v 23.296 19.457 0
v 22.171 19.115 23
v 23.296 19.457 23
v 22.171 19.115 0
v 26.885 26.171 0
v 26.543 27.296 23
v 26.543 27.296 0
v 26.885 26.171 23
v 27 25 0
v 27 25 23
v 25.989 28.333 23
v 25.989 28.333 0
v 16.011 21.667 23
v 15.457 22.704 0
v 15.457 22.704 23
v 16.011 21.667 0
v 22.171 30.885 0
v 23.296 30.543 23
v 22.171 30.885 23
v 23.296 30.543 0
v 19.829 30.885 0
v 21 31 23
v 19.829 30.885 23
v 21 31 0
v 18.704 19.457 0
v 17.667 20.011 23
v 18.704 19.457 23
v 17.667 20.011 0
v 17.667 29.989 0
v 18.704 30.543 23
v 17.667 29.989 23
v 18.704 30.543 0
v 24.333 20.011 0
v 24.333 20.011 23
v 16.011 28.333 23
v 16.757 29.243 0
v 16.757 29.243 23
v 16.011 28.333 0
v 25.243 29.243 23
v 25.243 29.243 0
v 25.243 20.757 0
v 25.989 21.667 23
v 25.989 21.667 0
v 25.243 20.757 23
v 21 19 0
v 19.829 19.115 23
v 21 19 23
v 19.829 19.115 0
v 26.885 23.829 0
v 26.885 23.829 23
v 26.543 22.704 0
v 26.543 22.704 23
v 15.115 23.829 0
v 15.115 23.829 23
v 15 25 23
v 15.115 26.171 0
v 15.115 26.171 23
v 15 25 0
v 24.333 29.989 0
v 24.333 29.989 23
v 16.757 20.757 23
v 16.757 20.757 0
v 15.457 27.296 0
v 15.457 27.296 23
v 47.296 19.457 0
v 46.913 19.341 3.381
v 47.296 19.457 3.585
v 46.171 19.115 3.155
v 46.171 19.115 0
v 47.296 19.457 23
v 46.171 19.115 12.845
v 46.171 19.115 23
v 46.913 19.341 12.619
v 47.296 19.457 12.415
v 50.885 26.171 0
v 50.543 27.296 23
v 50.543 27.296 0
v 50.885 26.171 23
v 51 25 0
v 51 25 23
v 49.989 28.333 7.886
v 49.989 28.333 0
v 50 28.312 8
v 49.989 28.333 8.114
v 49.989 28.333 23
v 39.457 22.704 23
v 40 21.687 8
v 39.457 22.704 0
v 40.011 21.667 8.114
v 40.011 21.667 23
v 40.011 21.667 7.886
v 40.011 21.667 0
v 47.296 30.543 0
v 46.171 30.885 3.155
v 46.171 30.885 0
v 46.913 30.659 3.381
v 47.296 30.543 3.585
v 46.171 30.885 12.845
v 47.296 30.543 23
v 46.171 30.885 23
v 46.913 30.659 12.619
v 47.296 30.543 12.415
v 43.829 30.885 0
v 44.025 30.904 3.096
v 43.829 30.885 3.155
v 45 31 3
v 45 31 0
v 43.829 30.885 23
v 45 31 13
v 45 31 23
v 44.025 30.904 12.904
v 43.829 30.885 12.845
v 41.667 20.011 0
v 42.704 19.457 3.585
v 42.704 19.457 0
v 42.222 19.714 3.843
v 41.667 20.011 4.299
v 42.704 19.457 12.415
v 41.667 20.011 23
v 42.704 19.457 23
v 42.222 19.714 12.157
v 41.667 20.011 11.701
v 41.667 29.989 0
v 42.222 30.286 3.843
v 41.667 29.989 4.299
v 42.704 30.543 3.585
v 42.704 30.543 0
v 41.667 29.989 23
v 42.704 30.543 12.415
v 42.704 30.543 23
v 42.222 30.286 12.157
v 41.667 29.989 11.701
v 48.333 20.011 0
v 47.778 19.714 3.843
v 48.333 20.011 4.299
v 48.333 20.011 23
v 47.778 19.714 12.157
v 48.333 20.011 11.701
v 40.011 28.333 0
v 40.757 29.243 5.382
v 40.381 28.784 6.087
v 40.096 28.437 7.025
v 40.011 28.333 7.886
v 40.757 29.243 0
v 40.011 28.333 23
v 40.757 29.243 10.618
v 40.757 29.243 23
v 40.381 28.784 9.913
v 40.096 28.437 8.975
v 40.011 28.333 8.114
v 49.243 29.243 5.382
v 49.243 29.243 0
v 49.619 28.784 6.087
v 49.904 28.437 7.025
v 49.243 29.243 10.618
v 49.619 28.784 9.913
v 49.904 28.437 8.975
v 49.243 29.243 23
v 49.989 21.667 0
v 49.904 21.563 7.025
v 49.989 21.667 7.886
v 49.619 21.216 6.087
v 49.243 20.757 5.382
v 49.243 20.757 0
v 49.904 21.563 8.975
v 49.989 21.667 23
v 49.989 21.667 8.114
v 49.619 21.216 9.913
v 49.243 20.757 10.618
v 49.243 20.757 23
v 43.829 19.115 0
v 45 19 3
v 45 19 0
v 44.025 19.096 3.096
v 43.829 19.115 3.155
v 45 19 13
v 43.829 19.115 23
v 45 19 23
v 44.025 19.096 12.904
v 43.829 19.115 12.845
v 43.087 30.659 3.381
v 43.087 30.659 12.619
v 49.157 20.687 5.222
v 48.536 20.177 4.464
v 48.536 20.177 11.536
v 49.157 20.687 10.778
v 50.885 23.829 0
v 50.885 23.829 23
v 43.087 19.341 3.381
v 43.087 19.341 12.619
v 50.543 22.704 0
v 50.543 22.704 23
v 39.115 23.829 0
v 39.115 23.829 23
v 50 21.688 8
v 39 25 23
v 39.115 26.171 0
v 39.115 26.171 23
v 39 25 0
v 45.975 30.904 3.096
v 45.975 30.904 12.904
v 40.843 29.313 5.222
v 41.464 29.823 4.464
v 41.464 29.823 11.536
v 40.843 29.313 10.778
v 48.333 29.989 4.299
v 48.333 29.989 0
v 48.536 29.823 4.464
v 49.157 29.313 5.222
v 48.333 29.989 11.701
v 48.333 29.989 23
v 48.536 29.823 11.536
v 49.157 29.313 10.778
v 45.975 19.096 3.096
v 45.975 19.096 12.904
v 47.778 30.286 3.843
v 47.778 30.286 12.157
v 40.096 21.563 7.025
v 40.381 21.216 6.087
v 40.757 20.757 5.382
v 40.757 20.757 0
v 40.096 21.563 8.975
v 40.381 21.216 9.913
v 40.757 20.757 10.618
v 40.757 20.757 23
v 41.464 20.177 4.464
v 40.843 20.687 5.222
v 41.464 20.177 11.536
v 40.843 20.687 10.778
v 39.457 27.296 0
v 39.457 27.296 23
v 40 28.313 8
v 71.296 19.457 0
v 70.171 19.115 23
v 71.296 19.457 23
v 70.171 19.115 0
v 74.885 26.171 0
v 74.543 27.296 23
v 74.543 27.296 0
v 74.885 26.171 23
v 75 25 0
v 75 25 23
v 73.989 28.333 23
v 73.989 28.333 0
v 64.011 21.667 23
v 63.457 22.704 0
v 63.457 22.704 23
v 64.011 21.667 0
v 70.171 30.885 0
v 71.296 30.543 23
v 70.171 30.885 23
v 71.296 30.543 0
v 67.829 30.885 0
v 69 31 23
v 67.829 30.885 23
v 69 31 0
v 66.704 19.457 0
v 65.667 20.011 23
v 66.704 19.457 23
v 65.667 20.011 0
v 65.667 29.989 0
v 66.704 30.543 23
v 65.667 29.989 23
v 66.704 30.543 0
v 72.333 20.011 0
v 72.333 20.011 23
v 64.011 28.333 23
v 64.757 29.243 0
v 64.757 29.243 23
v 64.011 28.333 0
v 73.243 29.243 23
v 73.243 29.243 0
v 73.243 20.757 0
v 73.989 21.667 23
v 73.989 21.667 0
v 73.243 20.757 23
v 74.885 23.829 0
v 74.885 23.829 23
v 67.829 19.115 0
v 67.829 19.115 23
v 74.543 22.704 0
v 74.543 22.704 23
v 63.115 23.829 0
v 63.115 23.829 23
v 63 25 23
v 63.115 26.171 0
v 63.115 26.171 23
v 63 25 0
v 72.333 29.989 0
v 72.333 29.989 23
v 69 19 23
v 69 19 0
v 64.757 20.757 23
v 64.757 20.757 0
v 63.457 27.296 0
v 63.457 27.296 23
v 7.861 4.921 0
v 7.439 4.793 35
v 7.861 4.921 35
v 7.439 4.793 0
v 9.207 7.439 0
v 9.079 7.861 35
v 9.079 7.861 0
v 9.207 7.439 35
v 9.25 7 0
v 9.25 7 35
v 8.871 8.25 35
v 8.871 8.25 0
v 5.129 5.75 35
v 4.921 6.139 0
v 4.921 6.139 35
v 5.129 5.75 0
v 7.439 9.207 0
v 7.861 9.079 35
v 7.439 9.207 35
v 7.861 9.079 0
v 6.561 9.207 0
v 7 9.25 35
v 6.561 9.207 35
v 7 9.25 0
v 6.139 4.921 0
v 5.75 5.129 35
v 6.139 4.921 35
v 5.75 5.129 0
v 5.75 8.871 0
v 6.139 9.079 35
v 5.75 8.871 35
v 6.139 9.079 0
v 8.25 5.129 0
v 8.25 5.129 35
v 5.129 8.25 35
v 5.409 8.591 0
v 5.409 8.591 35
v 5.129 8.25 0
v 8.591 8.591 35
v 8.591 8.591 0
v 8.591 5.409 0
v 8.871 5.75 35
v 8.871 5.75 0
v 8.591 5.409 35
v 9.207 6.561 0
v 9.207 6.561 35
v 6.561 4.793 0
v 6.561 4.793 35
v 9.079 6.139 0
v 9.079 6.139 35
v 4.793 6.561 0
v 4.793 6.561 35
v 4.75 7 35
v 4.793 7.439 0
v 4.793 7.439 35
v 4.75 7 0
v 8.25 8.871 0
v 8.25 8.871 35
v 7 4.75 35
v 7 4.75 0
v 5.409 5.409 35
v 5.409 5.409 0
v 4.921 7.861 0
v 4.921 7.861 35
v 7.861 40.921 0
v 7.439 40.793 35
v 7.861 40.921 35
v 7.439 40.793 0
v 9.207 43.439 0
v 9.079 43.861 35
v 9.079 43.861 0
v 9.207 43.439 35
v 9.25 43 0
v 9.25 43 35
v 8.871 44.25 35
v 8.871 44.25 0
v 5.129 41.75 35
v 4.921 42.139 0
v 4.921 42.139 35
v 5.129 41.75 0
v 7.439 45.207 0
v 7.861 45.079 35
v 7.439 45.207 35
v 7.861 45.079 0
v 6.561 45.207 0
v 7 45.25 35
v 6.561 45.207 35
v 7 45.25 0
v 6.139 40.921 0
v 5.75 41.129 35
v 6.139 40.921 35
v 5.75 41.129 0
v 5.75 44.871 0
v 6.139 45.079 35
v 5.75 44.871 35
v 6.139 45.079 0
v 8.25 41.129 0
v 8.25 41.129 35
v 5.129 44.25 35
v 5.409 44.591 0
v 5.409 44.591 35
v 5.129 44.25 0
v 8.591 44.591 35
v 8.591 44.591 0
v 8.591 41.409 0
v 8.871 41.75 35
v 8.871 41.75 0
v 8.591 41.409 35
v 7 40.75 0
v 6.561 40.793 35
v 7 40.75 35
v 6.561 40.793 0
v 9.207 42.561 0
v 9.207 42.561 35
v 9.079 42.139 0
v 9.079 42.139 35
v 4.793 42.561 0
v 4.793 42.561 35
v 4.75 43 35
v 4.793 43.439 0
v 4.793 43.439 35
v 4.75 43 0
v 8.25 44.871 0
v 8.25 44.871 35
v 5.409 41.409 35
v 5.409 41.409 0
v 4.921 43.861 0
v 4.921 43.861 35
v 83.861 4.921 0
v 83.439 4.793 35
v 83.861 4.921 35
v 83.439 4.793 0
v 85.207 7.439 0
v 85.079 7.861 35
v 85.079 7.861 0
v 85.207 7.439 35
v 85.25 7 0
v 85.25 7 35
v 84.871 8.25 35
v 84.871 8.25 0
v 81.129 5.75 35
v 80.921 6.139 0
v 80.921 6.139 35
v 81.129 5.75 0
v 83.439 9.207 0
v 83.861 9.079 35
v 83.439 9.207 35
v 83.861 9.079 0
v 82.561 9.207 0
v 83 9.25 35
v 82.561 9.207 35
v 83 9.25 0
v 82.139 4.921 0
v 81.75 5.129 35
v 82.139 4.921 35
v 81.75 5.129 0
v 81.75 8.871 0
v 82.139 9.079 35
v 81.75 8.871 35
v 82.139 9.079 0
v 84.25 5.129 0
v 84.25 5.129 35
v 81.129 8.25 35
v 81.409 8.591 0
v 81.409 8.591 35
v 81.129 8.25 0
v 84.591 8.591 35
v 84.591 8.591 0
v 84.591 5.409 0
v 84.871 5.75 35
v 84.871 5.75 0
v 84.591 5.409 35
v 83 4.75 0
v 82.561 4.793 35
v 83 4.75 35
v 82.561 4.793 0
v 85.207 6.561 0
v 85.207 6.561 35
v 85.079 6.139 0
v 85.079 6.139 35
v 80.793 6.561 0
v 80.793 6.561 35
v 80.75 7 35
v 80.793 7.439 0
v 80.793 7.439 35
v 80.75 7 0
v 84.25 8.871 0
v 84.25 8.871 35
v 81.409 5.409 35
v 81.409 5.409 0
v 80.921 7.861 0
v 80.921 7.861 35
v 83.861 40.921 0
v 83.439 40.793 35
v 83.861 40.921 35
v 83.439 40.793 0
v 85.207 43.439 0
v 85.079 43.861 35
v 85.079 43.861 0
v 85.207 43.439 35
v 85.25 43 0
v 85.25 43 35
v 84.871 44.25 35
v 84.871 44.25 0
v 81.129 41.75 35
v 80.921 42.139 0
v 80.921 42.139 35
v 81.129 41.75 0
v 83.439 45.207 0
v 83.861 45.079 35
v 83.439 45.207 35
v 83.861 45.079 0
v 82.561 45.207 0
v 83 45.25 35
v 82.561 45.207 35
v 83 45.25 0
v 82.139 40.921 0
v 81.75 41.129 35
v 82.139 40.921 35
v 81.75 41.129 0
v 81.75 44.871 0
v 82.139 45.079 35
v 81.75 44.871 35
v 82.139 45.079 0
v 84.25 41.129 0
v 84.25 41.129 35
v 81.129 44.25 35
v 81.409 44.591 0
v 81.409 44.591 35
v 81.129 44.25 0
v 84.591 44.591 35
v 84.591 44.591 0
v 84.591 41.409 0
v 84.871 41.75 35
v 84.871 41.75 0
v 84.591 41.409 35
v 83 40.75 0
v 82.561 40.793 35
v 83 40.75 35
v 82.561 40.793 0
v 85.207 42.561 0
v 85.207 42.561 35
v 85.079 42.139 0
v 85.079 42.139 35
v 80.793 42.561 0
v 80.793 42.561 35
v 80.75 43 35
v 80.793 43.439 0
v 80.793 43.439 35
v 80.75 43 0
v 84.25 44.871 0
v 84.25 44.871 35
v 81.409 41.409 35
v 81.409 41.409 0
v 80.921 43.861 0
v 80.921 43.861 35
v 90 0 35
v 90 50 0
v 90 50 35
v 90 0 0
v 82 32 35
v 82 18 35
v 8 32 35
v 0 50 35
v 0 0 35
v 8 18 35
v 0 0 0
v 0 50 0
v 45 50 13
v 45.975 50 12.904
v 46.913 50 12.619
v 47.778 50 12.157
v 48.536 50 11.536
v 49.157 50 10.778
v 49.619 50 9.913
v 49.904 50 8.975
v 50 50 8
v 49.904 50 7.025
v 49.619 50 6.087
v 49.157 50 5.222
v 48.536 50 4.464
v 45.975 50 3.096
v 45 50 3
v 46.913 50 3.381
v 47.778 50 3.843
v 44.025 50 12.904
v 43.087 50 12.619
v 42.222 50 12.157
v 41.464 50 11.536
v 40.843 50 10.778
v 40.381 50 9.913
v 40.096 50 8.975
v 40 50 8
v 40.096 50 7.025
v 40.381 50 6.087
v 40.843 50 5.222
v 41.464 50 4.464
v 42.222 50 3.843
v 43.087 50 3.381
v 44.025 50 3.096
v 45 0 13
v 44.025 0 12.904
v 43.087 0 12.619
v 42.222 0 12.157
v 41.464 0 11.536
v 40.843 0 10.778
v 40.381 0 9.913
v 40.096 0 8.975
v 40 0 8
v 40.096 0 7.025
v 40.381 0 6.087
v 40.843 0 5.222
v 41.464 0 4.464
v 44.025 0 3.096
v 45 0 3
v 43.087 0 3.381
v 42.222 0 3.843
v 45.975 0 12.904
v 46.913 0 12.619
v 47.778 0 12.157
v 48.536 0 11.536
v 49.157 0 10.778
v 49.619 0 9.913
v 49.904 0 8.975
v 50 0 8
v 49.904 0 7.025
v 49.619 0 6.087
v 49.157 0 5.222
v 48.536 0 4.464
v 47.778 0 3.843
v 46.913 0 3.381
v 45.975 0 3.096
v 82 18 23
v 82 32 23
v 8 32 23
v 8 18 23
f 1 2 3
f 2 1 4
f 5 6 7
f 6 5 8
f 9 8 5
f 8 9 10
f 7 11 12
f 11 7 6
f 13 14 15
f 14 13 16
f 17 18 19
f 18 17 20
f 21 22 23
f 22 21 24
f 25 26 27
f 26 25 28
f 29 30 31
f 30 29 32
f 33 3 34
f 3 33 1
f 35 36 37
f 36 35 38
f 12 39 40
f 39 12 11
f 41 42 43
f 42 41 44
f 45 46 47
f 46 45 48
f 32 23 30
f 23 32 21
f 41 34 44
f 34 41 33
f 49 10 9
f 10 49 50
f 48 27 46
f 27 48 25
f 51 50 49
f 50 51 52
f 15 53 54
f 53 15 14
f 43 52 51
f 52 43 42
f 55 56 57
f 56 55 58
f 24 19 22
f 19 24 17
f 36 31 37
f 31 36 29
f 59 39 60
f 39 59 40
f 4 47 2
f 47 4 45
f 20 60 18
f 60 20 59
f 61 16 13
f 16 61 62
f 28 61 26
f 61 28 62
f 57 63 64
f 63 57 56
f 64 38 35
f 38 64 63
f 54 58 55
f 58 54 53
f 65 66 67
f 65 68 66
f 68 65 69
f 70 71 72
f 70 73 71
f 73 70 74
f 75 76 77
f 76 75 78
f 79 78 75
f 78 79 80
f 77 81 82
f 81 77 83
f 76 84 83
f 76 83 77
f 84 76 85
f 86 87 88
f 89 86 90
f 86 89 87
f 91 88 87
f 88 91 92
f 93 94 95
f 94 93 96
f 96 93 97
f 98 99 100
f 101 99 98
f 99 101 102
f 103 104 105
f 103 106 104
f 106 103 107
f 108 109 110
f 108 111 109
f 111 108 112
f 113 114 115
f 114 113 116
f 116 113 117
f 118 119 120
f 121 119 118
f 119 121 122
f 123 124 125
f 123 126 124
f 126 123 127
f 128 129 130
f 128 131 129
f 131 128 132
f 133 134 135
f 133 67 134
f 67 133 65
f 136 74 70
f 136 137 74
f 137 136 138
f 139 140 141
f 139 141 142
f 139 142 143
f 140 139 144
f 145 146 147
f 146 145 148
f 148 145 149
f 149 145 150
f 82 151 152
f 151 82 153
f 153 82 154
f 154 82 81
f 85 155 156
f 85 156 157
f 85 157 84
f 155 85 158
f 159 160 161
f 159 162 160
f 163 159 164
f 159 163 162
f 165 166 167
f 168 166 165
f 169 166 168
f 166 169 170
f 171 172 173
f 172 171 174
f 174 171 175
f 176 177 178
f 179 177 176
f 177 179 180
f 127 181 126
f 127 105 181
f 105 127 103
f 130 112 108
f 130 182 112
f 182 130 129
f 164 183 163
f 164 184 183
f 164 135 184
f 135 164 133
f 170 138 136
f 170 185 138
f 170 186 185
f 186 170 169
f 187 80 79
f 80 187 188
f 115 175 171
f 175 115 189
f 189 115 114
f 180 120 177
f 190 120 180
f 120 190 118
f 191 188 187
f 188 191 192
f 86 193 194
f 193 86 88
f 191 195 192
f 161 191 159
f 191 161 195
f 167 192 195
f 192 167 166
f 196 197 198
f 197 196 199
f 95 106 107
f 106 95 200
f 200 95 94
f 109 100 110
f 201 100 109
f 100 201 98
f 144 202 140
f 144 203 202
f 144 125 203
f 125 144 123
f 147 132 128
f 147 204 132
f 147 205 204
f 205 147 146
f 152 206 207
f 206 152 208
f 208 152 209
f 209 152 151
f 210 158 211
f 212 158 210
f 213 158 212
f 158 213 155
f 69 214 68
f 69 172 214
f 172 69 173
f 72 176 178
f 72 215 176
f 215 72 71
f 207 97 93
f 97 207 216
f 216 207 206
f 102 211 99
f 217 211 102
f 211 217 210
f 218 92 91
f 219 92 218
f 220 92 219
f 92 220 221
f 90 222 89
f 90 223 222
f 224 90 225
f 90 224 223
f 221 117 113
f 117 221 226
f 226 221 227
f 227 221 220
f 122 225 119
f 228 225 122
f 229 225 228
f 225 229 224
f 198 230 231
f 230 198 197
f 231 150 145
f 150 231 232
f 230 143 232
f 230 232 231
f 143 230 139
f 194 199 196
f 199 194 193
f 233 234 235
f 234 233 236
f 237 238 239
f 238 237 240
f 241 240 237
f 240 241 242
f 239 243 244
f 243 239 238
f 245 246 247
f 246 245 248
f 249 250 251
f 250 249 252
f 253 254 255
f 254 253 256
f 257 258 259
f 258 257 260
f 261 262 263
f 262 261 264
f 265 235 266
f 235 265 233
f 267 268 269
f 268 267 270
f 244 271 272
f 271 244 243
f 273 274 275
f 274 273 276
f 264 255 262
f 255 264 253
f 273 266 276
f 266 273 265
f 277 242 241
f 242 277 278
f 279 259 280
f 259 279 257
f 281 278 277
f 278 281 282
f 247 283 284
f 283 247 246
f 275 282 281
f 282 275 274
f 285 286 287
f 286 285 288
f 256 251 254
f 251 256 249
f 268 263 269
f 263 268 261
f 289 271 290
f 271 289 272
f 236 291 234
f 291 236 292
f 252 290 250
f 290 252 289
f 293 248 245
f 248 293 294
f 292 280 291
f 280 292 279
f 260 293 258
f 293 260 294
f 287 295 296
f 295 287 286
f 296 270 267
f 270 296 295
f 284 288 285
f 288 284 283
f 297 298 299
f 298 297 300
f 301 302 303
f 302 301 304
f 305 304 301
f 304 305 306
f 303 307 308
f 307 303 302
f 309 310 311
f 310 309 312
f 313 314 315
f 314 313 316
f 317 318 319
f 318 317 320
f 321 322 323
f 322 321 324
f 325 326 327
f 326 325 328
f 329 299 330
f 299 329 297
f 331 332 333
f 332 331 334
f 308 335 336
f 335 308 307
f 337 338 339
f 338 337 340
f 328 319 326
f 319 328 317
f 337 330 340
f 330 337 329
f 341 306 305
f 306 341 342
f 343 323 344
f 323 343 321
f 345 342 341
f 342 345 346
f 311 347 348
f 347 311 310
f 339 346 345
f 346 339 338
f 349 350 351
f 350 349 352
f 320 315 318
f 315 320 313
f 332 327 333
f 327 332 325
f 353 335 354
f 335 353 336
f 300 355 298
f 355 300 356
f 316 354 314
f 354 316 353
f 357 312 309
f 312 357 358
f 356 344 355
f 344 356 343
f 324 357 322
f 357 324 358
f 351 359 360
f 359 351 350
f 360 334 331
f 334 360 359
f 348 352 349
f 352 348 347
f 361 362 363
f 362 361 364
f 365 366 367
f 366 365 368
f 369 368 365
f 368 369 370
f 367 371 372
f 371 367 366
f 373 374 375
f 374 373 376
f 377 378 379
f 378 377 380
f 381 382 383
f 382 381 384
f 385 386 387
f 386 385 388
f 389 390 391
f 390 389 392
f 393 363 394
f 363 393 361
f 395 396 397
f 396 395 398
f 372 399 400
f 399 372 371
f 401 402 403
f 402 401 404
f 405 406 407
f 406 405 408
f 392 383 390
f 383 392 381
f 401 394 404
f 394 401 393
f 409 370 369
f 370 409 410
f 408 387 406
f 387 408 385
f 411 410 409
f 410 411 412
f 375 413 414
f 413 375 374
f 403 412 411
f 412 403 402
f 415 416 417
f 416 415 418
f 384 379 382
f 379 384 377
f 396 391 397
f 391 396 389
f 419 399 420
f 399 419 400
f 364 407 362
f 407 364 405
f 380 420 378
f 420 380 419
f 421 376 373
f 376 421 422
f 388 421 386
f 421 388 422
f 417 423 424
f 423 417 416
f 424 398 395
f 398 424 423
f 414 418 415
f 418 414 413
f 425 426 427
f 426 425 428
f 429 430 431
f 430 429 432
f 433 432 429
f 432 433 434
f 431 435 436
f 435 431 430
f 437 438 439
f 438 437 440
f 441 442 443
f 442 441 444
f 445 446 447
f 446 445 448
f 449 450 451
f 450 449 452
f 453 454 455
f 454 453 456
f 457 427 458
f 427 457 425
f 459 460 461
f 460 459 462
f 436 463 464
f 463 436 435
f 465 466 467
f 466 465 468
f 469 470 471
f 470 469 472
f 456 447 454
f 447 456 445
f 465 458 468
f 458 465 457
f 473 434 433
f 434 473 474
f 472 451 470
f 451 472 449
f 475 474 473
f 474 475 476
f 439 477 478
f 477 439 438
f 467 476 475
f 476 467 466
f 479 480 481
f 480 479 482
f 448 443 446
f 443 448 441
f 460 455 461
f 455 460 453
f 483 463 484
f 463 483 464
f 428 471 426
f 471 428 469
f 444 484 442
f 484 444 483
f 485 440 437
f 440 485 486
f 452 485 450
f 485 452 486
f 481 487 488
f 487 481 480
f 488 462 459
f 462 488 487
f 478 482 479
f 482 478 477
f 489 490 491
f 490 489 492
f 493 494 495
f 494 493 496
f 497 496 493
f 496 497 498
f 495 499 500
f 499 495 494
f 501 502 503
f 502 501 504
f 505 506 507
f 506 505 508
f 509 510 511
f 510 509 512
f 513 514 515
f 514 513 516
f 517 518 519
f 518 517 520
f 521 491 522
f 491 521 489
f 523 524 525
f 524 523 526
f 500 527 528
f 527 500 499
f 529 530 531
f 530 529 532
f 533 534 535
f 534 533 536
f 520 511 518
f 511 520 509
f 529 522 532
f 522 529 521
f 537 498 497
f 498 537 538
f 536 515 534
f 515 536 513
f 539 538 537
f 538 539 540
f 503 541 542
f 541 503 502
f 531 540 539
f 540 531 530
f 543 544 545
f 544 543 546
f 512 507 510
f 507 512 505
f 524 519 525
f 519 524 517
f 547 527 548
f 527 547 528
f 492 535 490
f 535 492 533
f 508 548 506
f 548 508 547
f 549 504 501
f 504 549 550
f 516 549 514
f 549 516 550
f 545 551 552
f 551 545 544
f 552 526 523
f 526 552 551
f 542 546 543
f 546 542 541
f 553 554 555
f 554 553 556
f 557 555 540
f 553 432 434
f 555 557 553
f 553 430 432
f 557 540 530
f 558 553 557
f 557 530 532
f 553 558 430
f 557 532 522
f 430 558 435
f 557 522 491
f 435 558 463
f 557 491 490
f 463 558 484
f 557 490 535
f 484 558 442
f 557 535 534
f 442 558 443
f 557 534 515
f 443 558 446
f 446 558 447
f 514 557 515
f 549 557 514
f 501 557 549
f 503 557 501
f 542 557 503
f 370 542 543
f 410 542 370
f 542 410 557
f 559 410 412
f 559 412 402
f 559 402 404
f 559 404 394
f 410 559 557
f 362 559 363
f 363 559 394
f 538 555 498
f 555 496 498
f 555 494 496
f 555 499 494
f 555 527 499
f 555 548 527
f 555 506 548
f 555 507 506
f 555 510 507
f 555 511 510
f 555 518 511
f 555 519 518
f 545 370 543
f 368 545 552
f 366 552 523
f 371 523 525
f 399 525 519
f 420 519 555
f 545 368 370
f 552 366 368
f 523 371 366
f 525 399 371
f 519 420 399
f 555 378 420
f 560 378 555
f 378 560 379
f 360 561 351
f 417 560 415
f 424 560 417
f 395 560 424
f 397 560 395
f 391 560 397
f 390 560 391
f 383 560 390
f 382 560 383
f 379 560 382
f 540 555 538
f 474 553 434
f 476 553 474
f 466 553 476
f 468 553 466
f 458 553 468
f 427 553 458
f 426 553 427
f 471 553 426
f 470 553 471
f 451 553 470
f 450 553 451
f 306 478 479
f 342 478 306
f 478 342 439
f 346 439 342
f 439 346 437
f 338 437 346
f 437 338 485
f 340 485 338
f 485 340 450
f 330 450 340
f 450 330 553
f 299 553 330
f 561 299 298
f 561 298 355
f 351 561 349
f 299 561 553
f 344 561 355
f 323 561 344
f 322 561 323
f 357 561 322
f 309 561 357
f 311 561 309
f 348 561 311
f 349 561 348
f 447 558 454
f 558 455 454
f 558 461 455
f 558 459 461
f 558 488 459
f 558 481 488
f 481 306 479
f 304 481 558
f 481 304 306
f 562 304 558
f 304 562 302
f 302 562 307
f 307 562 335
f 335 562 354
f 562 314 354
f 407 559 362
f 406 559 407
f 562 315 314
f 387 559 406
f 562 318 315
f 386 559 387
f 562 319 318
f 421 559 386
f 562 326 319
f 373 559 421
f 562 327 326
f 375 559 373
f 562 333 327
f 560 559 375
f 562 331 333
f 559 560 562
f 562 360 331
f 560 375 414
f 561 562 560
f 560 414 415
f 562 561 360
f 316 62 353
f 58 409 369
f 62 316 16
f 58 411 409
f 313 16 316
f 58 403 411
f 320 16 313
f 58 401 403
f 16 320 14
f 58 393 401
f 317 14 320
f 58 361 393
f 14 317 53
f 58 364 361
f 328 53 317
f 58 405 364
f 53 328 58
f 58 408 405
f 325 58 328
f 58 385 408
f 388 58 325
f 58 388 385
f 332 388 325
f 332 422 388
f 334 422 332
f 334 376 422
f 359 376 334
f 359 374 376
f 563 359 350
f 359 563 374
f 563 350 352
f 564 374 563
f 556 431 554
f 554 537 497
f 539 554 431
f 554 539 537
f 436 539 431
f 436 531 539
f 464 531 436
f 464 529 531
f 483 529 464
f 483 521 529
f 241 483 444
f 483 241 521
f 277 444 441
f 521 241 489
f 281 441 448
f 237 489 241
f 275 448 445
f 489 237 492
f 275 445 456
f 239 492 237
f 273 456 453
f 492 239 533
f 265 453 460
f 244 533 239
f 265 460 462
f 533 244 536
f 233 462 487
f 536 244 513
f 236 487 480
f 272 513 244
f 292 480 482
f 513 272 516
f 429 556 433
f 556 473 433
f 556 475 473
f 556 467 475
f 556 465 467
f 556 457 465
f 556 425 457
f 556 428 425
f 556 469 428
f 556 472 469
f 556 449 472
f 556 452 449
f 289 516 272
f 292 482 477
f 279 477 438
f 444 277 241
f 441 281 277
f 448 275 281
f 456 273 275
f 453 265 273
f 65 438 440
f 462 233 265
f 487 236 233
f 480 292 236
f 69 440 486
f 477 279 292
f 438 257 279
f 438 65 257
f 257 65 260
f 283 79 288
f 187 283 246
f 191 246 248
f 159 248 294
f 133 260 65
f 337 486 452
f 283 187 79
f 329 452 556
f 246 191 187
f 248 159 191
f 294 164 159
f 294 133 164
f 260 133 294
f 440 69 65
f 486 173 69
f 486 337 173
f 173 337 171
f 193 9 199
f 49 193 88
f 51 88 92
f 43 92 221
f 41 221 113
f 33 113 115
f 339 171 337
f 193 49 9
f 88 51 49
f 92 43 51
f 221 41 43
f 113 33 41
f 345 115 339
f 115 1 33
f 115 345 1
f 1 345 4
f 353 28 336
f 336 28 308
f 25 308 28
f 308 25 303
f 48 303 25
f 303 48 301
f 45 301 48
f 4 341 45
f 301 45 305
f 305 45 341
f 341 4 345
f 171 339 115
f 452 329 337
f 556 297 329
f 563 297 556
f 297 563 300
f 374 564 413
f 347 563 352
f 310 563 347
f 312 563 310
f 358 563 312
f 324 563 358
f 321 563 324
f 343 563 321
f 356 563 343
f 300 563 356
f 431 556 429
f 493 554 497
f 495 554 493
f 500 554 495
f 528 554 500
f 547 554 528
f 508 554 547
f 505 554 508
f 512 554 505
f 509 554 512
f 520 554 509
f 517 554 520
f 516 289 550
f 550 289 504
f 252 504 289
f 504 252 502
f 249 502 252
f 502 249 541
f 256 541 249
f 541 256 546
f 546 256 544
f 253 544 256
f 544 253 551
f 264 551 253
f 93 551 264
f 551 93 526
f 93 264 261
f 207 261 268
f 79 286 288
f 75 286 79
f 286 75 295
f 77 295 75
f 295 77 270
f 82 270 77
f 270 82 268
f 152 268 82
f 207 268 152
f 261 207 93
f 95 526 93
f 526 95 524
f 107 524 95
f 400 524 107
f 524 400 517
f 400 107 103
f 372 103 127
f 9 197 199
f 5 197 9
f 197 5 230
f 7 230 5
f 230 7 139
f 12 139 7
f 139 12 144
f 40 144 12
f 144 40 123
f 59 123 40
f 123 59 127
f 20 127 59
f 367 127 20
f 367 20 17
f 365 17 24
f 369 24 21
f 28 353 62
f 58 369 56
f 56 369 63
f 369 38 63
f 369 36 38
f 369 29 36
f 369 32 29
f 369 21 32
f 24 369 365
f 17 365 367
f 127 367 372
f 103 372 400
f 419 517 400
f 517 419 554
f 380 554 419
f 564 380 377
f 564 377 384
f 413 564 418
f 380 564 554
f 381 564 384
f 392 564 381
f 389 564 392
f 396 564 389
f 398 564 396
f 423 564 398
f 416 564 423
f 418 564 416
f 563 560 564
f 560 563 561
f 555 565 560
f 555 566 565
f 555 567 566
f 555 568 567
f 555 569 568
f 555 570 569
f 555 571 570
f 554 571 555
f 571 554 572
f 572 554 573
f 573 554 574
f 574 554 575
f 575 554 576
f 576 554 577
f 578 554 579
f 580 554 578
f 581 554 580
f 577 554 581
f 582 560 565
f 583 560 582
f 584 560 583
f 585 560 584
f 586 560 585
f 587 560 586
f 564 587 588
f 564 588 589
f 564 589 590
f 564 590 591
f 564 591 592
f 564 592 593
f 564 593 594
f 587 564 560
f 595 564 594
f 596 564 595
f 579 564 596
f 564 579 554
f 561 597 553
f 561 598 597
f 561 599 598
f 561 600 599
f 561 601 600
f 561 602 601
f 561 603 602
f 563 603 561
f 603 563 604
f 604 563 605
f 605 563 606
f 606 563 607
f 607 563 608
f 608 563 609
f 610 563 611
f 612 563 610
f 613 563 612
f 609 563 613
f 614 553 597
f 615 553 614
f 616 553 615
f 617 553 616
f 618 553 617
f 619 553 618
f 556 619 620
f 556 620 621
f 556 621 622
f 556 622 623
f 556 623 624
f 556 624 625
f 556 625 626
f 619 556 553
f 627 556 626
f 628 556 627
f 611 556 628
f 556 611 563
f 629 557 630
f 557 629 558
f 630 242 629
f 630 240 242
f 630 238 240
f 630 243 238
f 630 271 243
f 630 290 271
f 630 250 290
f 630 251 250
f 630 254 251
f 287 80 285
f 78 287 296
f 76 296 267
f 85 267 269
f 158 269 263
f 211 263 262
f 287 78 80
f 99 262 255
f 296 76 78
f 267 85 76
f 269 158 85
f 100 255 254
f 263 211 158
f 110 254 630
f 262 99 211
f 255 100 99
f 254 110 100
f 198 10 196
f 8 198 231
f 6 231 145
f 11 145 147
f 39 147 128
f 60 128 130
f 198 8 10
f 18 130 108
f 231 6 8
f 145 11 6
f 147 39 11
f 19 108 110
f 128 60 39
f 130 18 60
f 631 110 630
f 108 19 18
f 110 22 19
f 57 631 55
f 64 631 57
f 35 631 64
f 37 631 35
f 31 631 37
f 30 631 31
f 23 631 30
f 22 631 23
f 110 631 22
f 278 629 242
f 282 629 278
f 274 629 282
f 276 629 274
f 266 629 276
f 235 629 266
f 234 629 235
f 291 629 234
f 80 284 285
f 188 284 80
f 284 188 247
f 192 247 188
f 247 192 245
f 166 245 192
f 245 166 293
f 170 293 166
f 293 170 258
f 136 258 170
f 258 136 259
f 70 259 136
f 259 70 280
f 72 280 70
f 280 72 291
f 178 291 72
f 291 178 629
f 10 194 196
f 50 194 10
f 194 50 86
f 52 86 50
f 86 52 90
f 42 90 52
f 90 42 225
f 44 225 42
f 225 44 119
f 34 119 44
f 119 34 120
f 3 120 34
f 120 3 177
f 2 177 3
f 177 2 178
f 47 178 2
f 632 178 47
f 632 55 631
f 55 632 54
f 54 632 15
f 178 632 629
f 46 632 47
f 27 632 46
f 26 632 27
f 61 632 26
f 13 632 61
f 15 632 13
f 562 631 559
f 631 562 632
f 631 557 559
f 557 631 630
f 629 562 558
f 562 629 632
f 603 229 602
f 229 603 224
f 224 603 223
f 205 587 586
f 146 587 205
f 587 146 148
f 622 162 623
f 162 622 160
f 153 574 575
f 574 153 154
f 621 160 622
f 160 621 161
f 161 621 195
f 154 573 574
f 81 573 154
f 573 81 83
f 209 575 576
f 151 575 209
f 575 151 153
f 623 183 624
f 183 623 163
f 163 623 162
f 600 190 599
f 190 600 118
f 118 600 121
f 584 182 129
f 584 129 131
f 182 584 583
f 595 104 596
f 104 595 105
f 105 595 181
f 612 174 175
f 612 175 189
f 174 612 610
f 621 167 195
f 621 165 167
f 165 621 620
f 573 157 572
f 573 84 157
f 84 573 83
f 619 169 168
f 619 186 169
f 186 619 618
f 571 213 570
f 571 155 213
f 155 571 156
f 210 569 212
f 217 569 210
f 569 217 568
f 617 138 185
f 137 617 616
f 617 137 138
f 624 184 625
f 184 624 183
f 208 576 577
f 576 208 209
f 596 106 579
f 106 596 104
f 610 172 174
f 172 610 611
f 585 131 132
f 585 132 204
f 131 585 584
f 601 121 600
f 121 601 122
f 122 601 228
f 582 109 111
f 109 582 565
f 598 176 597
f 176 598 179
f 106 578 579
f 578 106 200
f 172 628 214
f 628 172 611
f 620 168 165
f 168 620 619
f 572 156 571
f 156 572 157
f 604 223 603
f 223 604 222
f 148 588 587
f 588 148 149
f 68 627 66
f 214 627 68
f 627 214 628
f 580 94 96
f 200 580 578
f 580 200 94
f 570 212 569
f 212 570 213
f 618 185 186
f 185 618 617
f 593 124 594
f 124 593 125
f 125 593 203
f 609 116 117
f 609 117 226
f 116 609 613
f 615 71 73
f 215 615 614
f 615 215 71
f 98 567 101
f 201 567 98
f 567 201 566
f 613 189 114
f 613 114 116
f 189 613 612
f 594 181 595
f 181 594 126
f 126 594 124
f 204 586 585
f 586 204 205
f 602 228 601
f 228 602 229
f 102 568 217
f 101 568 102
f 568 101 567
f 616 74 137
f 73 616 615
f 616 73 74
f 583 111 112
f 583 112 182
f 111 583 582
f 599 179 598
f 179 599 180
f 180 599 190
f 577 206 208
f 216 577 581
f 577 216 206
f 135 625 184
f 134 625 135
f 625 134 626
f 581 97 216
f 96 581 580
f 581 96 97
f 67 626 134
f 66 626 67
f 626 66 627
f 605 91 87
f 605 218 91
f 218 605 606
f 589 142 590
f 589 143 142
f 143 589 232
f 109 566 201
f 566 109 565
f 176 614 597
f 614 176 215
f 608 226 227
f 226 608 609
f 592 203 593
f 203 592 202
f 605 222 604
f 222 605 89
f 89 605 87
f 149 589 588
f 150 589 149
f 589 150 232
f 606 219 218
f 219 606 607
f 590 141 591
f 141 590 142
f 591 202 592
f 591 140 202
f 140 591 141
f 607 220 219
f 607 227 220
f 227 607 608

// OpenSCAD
$fn = 32;

// ----------------------------------------------------------------------
// Manifold block: side_outlet manifold
// ----------------------------------------------------------------------

// --- parameters (mm) ---
block_l = 90;             // block length, X
block_w = 50;             // block width, Y
block_h = 35;             // block height, Z
port_d = 12;              // port bore diameter
port_pitch = 24;          // port pitch along X
gallery_d = 14;           // top gallery width, Y
gallery_depth = 12;       // gallery pocket depth
wall_p = 8;               // gallery end wall thickness, X
mnt_d = 4.5;              // mounting hole diameter
mnt_in = 7;               // mounting hole inset from the edges
out_d = 10;               // outlet bore diameter
out_z = 8;                // outlet axis height

n_ports = 3;  // ports in the row
port_x0 = (block_l - (n_ports - 1) * port_pitch) / 2;  // first port X

difference() {
  cube([block_l, block_w, block_h]);
  for (i = [0 : n_ports - 1])
    translate([port_x0 + i * port_pitch, block_w / 2, -1])
      cylinder(h = block_h + 2, d = port_d);
  translate([wall_p, block_w / 2 - gallery_d / 2, block_h - gallery_depth])
    cube([block_l - 2 * wall_p, gallery_d, gallery_depth + 1]);
  for (cx = [mnt_in, block_l - mnt_in])
    for (cy = [mnt_in, block_w - mnt_in])
      translate([cx, cy, -1]) cylinder(h = block_h + 2, d = mnt_d);
  translate([block_l / 2, -1, out_z]) rotate([-90, 0, 0])
    cylinder(h = block_w + 2, d = out_d);
}
